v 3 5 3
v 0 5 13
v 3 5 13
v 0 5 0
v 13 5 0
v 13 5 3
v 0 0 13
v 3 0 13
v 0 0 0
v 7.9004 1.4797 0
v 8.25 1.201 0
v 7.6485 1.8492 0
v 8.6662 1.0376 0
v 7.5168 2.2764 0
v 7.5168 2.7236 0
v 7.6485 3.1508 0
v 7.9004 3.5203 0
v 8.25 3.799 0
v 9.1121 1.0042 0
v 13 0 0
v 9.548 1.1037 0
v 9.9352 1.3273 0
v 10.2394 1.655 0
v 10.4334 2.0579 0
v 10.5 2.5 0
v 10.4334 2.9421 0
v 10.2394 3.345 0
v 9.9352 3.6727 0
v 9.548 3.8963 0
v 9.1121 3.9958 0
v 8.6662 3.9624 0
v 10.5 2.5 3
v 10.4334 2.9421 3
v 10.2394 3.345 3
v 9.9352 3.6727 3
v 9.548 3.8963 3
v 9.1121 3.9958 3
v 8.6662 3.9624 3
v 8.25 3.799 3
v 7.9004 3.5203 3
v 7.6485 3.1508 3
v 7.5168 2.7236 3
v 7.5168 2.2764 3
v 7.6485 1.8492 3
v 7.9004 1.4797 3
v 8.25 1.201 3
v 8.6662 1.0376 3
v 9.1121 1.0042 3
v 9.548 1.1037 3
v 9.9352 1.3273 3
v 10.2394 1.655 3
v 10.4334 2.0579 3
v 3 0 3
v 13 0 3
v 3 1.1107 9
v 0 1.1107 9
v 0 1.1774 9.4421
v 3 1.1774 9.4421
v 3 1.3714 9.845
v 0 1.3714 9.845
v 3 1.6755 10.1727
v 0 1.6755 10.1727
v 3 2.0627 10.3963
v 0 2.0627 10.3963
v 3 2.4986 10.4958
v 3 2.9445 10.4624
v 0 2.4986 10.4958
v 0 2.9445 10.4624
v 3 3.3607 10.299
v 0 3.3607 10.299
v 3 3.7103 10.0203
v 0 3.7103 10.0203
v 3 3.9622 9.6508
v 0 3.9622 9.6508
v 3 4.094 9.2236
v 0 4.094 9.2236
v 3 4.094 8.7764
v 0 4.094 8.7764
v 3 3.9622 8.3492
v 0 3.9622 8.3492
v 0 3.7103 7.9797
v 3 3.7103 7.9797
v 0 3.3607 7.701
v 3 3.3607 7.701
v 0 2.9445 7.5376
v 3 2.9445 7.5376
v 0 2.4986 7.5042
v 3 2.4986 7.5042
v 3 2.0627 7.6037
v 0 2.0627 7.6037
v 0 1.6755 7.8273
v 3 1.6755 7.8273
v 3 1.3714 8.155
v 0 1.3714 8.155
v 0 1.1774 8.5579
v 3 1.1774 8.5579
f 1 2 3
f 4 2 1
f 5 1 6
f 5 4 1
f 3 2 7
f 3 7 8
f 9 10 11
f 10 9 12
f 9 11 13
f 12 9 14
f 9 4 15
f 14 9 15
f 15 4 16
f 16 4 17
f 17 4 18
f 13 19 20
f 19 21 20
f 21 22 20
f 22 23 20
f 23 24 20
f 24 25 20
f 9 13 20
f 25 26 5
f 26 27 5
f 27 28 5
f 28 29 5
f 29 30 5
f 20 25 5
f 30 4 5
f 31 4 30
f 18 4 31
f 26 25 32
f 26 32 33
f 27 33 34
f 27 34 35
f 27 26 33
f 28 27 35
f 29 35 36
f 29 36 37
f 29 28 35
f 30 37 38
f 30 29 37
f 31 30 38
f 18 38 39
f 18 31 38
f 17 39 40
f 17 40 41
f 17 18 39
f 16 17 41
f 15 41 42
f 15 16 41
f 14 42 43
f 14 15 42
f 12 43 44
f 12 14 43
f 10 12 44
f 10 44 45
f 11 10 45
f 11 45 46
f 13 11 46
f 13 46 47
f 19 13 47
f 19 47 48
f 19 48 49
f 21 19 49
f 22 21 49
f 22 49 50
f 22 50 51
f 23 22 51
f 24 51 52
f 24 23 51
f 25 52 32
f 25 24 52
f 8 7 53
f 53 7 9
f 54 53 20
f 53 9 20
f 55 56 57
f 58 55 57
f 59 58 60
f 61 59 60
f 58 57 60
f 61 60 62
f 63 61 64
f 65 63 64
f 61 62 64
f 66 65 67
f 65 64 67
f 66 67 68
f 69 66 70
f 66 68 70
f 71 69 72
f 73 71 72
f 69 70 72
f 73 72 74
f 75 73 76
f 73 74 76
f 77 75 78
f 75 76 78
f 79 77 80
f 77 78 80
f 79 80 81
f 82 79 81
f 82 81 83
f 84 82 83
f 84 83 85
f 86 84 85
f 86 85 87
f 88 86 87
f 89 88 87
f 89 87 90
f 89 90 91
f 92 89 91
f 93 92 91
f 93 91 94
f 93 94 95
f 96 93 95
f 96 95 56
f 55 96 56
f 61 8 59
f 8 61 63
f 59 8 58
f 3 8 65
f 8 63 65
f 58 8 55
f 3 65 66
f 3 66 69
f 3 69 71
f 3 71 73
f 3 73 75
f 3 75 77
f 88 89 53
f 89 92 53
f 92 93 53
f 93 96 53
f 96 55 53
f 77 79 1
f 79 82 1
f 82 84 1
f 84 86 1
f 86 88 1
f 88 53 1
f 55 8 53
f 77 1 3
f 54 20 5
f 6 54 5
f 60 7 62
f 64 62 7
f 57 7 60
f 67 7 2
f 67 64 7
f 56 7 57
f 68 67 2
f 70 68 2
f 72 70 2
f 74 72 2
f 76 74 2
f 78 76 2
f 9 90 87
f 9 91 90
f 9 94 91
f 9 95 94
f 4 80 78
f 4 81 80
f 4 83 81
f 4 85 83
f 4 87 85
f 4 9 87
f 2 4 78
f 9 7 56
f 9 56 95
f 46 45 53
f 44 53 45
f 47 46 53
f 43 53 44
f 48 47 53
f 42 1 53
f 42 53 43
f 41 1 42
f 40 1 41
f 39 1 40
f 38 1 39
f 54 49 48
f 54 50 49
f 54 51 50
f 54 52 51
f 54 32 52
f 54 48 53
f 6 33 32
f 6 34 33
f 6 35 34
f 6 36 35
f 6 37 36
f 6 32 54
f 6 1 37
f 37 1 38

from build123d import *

# Parameters (mm, degrees)
SKETCH_W     = 13
SKETCH_H     = 5
SKETCH_R     = 1.5
PAD_DEPTH    = 3
SKETCH001_W  = 3
SKETCH001_H  = 5
PAD001_DEPTH = 10
SKETCH002_R  = 1.5
POCKET_DEPTH = 13.001


with BuildPart() as part:
    # Sketch → Pad (new body)
    with BuildSketch(Plane.XY):
        with Locations((6.5, 2.5)):
            Rectangle(SKETCH_W, SKETCH_H)
        with Locations((9, 2.5)):
            Circle(SKETCH_R, mode=Mode.SUBTRACT)
    extrude(amount=PAD_DEPTH)

    # Sketch001 → Pad001 (new body)
    with BuildSketch(Plane.XY.offset(3)):
        with Locations((1.5, 2.5)):
            Rectangle(SKETCH001_W, SKETCH001_H)
    extrude(amount=PAD001_DEPTH)

    # Sketch002 → Pocket (cut, through all)
    with BuildSketch(Plane(origin=(0, 0, 0), x_dir=(0, -1, 0), z_dir=(-1, 0, 0))):
        with Locations((-2.610739, 9)):
            Circle(SKETCH002_R)
    extrude(amount=-POCKET_DEPTH, mode=Mode.SUBTRACT)


solid = part.part
